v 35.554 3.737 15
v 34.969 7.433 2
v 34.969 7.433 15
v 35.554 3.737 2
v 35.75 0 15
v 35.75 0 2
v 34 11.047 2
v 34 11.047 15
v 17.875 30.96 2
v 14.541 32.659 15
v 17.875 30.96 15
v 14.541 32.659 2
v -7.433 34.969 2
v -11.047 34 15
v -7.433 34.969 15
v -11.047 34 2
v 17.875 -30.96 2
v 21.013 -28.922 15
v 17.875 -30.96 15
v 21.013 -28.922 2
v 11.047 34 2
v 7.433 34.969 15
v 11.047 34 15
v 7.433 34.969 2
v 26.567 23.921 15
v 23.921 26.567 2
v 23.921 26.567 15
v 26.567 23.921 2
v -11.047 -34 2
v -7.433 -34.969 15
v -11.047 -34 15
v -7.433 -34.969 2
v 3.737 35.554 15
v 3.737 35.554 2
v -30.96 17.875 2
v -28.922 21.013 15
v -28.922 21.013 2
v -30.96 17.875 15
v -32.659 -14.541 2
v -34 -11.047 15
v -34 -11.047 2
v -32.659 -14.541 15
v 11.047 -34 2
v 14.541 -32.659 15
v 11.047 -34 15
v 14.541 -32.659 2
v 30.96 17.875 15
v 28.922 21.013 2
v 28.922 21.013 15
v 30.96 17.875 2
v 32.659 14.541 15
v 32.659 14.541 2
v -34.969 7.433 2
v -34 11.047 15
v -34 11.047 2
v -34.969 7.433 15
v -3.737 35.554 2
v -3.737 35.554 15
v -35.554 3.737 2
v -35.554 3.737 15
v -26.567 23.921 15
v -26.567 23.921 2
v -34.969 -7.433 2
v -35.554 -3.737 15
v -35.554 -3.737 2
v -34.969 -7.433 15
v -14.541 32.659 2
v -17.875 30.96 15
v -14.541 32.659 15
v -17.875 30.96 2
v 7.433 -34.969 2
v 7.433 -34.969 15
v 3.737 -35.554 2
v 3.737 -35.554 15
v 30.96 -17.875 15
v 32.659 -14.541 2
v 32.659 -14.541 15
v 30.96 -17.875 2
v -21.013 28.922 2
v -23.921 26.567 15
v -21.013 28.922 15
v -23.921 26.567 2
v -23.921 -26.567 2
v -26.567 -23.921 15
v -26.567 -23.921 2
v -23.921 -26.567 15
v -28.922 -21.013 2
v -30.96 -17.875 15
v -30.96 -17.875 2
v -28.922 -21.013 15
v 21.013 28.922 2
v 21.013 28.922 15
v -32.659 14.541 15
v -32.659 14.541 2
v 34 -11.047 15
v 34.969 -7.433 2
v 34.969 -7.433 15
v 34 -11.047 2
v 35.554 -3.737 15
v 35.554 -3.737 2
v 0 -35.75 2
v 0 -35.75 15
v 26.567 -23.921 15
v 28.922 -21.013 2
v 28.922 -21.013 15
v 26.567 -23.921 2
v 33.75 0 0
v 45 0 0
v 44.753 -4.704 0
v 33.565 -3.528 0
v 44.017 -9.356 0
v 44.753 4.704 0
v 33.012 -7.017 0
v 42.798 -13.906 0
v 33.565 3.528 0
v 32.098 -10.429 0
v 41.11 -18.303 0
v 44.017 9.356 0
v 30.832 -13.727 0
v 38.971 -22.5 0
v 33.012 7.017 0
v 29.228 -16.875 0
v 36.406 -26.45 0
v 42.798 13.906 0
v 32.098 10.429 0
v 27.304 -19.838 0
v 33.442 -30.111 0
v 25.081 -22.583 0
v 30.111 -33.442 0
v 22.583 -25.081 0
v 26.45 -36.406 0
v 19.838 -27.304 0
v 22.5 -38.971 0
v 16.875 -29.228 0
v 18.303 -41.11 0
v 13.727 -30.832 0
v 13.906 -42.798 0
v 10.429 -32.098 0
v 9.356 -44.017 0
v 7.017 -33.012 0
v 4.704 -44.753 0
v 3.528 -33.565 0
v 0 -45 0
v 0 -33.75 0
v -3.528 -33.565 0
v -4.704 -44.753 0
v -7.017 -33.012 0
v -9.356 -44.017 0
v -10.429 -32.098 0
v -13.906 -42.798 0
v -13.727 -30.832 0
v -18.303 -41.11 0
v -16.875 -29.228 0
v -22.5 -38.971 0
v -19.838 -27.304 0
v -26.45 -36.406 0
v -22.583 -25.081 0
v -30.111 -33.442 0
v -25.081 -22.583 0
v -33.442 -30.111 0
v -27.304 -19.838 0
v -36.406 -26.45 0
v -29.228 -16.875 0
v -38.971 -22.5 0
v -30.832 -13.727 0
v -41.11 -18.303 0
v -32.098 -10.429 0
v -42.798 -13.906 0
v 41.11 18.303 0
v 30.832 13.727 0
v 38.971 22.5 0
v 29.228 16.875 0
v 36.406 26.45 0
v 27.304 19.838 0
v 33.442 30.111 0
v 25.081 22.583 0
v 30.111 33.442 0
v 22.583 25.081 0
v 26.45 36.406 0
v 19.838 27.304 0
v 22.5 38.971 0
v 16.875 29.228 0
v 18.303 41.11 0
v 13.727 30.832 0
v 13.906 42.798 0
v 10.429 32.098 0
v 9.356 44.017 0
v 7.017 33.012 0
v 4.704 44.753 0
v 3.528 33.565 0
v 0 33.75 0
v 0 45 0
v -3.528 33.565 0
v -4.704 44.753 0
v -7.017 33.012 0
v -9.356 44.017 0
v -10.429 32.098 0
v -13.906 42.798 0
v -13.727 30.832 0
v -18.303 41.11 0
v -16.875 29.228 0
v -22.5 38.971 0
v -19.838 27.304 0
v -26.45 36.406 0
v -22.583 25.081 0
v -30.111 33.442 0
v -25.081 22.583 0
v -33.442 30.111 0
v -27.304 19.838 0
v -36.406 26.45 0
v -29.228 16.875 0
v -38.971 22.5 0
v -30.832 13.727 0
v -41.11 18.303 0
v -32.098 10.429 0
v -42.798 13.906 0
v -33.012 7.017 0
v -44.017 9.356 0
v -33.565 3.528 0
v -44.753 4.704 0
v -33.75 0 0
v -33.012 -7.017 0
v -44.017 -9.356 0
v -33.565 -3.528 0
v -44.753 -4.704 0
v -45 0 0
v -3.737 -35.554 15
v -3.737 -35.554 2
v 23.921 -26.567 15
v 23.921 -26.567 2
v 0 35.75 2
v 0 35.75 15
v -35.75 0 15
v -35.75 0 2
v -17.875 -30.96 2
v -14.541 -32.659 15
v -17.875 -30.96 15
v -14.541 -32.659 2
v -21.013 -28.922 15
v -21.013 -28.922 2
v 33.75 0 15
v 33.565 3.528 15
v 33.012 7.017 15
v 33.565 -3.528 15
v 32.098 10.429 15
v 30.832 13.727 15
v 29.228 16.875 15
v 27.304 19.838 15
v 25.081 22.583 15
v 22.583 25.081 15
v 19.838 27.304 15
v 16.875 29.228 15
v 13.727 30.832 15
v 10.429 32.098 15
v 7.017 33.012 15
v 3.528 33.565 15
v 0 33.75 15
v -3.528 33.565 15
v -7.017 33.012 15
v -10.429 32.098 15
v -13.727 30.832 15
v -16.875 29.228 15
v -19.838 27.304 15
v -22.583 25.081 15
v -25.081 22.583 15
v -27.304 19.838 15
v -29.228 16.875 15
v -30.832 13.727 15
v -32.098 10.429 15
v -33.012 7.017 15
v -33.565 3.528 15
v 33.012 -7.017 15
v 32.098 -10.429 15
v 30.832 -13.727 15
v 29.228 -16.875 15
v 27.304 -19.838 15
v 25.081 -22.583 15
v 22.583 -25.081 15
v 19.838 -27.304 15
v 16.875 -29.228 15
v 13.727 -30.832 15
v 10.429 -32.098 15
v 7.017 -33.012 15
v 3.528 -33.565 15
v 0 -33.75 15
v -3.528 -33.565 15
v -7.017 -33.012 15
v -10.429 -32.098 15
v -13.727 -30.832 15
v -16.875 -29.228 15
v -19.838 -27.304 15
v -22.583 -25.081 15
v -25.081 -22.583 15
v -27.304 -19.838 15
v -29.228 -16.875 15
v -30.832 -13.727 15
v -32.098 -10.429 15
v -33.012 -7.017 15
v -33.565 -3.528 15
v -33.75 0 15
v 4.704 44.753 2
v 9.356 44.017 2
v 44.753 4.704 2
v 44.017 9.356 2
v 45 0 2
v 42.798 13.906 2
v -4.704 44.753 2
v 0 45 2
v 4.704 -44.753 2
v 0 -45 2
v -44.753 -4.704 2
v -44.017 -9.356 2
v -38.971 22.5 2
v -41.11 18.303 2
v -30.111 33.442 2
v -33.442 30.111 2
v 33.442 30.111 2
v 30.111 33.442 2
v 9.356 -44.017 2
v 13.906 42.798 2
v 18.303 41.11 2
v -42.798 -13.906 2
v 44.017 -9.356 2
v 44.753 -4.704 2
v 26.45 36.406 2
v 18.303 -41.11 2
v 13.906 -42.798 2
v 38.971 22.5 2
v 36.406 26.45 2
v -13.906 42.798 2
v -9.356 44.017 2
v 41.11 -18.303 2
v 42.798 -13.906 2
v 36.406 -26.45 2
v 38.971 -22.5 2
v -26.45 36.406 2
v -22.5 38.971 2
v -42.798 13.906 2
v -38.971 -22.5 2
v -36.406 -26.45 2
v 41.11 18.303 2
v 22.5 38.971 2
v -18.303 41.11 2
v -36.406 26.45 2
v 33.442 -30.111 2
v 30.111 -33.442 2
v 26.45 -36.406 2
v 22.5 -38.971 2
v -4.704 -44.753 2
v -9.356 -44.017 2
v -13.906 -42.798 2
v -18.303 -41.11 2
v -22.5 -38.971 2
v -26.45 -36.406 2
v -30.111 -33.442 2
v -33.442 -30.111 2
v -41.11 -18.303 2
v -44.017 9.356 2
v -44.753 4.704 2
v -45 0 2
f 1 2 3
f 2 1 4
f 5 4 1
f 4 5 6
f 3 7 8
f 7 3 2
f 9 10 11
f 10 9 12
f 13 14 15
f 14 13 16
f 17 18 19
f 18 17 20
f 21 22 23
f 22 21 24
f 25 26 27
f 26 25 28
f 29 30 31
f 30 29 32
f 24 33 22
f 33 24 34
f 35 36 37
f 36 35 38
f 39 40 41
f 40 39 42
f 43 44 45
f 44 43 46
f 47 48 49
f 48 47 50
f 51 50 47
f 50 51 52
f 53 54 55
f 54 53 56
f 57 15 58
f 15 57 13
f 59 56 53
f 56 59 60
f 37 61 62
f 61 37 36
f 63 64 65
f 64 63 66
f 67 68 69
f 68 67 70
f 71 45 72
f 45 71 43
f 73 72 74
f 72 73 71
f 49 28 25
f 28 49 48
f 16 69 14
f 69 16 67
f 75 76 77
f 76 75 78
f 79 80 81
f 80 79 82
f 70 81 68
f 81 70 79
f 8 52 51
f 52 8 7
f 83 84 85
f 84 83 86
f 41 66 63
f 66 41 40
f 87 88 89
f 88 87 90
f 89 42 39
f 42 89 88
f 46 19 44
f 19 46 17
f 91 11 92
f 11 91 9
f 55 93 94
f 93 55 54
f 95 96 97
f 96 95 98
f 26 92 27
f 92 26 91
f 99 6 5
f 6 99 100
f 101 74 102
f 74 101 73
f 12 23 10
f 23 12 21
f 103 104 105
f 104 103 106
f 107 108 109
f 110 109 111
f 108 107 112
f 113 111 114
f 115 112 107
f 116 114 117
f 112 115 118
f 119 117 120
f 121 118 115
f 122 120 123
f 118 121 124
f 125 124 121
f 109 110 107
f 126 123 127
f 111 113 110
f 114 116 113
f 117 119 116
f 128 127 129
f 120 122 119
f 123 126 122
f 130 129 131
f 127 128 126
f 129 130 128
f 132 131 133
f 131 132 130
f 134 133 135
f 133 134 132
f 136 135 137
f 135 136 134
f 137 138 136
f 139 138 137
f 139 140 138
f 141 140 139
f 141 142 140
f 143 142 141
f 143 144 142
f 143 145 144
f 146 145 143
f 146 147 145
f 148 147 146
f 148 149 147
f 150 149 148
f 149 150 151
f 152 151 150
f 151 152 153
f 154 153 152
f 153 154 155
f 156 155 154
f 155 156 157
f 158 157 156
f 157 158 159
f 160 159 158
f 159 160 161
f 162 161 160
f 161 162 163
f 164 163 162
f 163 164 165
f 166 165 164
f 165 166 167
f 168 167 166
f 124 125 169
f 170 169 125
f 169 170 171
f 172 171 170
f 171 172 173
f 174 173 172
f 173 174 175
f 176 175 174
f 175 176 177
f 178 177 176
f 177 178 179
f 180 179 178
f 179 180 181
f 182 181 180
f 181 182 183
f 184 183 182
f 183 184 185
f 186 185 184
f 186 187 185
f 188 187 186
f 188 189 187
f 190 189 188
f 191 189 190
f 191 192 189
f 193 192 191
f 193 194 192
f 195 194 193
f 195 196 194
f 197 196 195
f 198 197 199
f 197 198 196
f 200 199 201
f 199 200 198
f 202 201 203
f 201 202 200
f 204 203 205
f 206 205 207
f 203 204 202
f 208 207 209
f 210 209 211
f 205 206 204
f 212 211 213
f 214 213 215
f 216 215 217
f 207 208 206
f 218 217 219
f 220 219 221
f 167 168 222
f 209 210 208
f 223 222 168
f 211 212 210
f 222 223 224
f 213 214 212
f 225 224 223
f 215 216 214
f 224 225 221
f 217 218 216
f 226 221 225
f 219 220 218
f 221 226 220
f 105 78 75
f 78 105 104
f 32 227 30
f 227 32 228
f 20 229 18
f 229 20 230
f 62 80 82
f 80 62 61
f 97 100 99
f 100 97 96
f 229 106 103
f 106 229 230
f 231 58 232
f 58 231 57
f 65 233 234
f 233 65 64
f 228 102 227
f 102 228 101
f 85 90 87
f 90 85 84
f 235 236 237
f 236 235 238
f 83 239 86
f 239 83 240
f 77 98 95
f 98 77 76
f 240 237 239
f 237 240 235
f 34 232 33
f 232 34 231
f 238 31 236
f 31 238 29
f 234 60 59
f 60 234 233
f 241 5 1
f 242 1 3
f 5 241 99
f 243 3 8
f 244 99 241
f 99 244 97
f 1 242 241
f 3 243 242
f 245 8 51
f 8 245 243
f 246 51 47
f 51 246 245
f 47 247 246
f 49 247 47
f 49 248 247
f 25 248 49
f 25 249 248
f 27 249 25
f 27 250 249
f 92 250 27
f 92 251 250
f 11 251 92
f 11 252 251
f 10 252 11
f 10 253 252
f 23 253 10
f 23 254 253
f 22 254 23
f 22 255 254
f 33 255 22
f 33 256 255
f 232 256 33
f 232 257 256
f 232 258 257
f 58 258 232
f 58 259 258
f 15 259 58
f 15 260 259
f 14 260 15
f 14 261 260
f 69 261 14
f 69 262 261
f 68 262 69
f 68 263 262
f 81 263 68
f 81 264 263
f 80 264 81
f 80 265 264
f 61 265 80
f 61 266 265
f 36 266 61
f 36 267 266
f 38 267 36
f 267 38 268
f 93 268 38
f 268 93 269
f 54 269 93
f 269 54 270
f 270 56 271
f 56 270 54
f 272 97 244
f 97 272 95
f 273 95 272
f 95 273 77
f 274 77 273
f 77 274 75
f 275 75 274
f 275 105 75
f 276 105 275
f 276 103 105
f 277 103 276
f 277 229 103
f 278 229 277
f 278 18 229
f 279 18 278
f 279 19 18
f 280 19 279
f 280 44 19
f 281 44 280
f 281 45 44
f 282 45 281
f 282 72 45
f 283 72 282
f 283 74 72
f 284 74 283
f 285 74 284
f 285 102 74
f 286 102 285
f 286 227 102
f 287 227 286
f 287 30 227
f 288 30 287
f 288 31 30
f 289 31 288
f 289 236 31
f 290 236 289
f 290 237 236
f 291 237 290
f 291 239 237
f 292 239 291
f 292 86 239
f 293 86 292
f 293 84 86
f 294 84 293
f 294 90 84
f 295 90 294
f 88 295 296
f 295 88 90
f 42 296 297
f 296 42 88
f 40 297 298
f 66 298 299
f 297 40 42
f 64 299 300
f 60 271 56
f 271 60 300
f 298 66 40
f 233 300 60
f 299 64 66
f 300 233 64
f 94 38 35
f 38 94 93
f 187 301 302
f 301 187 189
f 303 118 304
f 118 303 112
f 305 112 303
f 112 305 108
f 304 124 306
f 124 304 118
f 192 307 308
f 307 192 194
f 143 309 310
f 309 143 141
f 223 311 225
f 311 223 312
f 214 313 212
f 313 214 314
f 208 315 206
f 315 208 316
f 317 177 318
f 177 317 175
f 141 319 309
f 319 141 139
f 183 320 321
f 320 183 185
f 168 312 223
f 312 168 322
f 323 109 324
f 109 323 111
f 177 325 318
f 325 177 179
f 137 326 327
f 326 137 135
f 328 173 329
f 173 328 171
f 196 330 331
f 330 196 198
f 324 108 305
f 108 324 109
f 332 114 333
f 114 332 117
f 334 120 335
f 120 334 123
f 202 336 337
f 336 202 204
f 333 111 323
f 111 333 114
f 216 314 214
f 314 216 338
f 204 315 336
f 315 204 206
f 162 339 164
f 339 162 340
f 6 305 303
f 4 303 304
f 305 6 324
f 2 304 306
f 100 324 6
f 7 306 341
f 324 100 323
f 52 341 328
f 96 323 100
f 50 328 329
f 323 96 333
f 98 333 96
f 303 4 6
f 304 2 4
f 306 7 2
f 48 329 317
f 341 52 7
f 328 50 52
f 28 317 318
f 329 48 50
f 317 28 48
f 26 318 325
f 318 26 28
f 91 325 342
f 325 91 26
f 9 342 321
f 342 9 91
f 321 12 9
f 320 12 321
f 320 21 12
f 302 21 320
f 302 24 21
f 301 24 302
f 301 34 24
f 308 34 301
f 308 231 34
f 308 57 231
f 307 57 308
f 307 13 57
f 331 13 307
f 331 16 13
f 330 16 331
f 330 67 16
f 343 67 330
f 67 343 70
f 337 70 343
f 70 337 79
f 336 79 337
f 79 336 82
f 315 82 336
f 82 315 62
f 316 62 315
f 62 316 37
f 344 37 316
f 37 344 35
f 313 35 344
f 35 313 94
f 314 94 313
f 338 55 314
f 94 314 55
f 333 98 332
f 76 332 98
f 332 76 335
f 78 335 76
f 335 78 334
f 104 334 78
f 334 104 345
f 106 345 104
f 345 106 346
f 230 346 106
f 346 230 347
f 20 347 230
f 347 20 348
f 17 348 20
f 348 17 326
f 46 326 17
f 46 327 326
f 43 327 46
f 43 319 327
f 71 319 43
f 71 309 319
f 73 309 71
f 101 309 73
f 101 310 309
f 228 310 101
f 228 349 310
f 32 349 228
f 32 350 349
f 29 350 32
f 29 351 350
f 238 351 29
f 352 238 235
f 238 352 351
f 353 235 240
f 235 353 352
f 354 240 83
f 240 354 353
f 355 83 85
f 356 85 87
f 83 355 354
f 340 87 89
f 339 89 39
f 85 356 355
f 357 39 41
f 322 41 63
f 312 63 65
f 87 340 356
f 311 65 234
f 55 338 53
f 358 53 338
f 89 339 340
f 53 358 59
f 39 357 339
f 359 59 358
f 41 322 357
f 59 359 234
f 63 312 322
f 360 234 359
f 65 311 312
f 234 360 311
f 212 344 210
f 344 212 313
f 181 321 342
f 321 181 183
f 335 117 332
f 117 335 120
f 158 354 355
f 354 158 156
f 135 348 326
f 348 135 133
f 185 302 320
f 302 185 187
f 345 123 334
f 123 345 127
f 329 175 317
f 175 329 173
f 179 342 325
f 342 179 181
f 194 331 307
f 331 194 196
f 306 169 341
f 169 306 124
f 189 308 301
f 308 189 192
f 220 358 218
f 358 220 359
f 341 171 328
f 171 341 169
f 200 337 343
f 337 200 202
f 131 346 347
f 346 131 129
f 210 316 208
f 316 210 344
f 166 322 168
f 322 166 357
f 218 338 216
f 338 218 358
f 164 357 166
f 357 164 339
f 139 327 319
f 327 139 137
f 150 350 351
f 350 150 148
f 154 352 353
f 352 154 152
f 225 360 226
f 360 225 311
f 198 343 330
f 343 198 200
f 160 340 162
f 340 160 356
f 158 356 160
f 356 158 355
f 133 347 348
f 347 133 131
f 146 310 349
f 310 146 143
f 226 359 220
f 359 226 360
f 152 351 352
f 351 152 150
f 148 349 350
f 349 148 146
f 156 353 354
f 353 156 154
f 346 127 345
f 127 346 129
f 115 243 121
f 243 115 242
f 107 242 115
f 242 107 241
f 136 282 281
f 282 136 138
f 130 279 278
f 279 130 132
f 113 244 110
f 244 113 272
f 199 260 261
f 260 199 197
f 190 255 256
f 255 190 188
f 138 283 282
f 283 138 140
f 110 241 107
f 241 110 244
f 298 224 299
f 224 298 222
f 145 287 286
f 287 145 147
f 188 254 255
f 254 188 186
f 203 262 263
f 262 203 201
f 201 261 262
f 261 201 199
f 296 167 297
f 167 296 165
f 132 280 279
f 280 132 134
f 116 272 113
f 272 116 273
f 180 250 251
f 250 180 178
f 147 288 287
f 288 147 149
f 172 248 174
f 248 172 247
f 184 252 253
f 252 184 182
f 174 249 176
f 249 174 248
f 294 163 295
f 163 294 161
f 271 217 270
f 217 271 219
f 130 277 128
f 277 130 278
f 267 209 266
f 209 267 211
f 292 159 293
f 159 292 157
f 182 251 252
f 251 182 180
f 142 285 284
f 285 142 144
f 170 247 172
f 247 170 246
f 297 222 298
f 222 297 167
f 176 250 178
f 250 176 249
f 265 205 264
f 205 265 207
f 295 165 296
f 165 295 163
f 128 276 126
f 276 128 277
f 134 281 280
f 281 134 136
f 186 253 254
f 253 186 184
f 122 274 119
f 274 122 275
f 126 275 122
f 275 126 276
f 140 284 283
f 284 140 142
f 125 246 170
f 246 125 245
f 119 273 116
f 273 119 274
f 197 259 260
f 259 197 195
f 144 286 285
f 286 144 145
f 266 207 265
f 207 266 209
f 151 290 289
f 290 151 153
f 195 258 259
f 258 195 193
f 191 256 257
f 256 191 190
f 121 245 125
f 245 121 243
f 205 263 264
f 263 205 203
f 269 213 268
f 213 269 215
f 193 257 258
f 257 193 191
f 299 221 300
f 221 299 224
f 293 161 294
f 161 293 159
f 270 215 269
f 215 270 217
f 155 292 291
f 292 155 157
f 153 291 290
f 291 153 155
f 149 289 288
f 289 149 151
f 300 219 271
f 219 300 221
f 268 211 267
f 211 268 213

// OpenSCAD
$fn = 60;
inner = 67.5;
outer = 90;
inner_z = 15;
wall = 2;

difference() {
  union() {
    cylinder(d=inner+wall*2,h=inner_z);
    cylinder(d=outer,h=wall);
  }    
  cylinder(d=inner,h=inner_z);
}
